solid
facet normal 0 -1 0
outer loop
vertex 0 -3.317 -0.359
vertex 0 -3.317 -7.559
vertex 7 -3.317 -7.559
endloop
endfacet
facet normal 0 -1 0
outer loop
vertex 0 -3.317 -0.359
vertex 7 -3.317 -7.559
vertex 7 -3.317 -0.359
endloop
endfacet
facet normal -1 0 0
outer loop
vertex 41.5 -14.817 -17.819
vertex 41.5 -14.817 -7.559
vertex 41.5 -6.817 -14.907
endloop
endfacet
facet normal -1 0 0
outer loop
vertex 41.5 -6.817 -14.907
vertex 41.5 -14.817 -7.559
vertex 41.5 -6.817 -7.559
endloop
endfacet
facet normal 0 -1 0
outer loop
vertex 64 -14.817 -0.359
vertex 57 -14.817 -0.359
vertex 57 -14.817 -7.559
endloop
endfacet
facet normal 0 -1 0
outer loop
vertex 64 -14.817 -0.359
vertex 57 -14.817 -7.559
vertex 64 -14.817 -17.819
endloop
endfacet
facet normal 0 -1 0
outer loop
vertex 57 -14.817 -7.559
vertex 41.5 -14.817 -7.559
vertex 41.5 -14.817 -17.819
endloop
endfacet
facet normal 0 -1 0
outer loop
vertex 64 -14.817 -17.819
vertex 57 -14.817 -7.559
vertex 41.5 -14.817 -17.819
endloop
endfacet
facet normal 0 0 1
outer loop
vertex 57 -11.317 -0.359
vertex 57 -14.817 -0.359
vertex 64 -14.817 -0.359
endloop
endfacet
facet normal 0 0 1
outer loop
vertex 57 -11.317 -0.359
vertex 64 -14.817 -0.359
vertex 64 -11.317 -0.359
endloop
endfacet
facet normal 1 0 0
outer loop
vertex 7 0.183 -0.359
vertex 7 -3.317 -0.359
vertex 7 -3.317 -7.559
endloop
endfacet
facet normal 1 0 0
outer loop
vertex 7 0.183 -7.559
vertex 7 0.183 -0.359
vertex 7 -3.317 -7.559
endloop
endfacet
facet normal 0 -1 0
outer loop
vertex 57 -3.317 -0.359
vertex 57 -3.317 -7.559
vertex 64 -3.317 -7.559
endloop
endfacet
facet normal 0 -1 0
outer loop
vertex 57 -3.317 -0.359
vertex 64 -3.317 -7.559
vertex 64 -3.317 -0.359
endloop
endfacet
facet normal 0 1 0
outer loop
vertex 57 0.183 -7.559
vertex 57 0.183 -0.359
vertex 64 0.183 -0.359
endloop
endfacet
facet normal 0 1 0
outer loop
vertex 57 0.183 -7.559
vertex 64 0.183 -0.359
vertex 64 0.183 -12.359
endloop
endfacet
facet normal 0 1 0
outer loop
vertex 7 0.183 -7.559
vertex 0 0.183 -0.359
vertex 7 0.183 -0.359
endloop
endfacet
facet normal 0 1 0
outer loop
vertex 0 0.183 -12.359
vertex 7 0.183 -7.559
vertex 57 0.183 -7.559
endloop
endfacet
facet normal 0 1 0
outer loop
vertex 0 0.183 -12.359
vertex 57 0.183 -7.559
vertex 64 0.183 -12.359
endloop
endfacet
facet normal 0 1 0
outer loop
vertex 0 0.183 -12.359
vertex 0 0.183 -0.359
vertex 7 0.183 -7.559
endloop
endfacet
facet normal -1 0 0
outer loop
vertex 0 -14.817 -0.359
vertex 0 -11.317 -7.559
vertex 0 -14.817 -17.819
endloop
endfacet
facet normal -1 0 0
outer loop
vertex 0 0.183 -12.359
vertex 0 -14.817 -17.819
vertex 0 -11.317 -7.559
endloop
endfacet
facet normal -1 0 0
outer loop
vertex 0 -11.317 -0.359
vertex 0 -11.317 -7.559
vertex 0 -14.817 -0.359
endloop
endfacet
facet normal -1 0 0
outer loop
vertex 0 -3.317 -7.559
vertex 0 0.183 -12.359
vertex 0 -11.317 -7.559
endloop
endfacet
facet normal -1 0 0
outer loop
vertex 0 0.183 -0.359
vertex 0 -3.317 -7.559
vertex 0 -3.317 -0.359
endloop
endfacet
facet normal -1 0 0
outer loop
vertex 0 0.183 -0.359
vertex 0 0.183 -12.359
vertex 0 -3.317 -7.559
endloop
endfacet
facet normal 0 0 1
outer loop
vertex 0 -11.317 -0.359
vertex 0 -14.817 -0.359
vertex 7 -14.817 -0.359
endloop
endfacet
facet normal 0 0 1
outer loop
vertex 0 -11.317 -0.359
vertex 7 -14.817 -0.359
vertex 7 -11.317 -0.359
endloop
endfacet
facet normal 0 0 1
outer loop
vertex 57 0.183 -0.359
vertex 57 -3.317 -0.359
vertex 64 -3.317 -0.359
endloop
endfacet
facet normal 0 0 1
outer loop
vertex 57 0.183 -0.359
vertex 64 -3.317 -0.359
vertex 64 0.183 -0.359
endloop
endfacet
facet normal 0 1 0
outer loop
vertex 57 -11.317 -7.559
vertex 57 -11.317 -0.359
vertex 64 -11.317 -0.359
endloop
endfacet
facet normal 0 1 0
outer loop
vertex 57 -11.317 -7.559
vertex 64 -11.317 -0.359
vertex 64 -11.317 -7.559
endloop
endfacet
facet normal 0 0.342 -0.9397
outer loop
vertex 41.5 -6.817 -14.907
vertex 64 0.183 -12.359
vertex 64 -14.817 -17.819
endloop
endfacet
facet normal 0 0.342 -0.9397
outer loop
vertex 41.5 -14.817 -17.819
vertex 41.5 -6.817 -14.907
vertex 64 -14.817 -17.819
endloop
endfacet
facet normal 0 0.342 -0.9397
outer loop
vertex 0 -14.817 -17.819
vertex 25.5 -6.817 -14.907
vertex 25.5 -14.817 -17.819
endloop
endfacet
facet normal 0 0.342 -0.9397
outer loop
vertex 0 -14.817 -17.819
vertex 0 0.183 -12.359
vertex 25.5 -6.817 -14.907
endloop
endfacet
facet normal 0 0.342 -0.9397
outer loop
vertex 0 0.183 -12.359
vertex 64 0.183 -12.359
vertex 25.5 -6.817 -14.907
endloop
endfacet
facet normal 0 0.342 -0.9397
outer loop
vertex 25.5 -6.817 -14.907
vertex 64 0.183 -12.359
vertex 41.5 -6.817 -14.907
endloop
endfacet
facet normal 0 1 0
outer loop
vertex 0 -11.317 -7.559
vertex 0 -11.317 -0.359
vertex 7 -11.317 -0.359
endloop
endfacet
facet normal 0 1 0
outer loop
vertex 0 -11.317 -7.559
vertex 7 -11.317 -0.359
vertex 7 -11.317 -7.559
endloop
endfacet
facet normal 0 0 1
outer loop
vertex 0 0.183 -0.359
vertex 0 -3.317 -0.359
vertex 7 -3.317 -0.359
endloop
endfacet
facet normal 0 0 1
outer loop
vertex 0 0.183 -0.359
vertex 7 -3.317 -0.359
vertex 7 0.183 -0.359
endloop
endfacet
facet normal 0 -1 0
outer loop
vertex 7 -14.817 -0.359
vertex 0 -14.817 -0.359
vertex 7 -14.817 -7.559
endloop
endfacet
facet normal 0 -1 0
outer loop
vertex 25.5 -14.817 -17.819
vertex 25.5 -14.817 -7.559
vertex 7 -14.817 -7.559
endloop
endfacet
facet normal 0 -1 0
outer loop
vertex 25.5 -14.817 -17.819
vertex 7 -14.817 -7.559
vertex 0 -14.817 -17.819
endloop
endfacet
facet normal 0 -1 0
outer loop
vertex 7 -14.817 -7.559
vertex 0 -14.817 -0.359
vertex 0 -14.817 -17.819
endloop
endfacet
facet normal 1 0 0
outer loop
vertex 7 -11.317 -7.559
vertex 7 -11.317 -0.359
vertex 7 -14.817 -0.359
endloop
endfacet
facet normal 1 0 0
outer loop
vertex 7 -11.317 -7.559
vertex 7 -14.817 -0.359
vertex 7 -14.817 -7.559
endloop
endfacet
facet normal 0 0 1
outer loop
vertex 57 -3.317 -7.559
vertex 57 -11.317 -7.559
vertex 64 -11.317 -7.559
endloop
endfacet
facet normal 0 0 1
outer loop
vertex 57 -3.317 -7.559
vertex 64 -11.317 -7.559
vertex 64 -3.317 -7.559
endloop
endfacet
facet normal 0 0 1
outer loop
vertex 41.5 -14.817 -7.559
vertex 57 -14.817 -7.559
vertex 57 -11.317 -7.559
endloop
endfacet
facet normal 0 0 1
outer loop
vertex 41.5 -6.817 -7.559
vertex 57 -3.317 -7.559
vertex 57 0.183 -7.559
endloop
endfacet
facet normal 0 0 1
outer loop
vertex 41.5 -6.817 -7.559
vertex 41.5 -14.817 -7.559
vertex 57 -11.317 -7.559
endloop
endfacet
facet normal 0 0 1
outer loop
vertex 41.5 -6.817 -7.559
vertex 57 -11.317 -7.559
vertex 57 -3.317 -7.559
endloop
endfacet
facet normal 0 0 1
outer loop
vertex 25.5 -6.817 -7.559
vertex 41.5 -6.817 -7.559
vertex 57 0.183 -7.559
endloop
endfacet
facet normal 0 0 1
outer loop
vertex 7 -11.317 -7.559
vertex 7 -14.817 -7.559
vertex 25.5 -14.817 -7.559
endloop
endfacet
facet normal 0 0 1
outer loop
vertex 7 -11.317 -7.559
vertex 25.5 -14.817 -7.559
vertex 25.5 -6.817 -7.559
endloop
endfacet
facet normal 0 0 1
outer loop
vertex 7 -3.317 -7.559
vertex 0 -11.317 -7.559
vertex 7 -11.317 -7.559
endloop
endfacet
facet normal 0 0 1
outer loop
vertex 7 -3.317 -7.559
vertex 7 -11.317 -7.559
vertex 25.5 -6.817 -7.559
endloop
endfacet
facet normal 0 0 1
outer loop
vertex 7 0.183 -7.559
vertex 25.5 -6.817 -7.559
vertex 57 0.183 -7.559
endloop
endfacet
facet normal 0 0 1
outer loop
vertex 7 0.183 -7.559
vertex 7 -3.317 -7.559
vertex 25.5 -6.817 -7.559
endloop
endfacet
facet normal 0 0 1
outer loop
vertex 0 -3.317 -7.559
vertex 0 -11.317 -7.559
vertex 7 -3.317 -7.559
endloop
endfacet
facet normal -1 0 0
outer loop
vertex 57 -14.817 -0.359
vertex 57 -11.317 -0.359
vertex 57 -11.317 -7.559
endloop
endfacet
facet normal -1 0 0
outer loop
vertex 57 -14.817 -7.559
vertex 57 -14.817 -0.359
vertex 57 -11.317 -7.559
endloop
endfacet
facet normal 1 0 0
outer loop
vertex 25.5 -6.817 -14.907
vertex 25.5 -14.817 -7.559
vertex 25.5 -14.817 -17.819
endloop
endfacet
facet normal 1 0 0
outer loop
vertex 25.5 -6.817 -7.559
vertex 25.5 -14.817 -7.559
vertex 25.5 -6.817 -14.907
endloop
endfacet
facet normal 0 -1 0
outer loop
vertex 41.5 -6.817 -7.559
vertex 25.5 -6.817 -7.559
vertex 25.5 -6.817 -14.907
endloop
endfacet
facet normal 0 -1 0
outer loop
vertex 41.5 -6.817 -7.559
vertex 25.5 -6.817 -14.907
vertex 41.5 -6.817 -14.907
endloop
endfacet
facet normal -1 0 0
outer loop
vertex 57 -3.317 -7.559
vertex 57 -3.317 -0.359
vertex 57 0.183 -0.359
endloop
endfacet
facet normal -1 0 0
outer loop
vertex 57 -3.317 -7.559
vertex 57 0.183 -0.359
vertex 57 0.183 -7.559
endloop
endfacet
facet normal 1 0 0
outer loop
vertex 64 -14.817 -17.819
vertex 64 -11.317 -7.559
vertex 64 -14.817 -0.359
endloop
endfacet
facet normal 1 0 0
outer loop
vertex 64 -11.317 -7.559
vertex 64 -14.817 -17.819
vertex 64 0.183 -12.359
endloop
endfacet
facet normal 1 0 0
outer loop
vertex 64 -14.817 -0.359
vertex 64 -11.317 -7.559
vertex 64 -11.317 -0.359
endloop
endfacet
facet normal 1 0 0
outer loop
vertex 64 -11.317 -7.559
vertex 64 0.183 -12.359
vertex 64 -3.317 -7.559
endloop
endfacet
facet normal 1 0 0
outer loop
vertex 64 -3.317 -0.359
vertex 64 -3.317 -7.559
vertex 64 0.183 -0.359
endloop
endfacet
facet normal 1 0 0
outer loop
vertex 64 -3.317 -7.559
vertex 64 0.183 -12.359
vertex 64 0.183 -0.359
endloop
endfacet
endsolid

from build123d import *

# Parameters (mm, degrees)
BOSS_EXTRUDE1_DEPTH     = 64
SKETCH2_W               = 50
SKETCH2_H               = 7.2
CUT_EXTRUDE1_DEPTH      = 12.5
CUT_EXTRUDE1_DEPTH_BACK = 4.5
SKETCH3_W               = 16
SKETCH3_H               = 8
CUT_EXTRUDE2_DEPTH      = 64


with BuildPart() as part:
    # Sketch1 → Boss-Extrude1 (new body)
    with BuildSketch(Plane(origin=(0, 0, 0), x_dir=(0, 0, -1), z_dir=(1, 0, 0))):
        Polygon((0.359176952, -3.317134482), (0.359176952, 0.182865518), (12.359176952, 0.182865518), (17.818730466, -14.817134482), (12.359176952, -14.817134482), (0.359176952, -14.817134482), (0.359176952, -11.317134482), (7.559176952, -11.317134482), (7.559176952, -3.317134482), align=None)
    extrude(amount=BOSS_EXTRUDE1_DEPTH)

    # Sketch2 → Cut-Extrude1 (cut, two sides)
    with BuildSketch(Plane(origin=(0, -11.317134482, 0), x_dir=(1, 0, 0), z_dir=(0, 1, 0))) as cut_extrude1_sk:
        with Locations((32, 3.959176952)):
            Rectangle(SKETCH2_W, SKETCH2_H)
    extrude(amount=CUT_EXTRUDE1_DEPTH, mode=Mode.SUBTRACT)
    extrude(cut_extrude1_sk.sketch, amount=-CUT_EXTRUDE1_DEPTH_BACK, mode=Mode.SUBTRACT)

    # Sketch3 → Cut-Extrude2 (cut)
    with BuildSketch(Plane.XY.offset(-7.559176952)):
        with Locations((33.5, -10.817134482)):
            Rectangle(SKETCH3_W, SKETCH3_H)
    extrude(amount=-CUT_EXTRUDE2_DEPTH, mode=Mode.SUBTRACT)


solid = part.part
